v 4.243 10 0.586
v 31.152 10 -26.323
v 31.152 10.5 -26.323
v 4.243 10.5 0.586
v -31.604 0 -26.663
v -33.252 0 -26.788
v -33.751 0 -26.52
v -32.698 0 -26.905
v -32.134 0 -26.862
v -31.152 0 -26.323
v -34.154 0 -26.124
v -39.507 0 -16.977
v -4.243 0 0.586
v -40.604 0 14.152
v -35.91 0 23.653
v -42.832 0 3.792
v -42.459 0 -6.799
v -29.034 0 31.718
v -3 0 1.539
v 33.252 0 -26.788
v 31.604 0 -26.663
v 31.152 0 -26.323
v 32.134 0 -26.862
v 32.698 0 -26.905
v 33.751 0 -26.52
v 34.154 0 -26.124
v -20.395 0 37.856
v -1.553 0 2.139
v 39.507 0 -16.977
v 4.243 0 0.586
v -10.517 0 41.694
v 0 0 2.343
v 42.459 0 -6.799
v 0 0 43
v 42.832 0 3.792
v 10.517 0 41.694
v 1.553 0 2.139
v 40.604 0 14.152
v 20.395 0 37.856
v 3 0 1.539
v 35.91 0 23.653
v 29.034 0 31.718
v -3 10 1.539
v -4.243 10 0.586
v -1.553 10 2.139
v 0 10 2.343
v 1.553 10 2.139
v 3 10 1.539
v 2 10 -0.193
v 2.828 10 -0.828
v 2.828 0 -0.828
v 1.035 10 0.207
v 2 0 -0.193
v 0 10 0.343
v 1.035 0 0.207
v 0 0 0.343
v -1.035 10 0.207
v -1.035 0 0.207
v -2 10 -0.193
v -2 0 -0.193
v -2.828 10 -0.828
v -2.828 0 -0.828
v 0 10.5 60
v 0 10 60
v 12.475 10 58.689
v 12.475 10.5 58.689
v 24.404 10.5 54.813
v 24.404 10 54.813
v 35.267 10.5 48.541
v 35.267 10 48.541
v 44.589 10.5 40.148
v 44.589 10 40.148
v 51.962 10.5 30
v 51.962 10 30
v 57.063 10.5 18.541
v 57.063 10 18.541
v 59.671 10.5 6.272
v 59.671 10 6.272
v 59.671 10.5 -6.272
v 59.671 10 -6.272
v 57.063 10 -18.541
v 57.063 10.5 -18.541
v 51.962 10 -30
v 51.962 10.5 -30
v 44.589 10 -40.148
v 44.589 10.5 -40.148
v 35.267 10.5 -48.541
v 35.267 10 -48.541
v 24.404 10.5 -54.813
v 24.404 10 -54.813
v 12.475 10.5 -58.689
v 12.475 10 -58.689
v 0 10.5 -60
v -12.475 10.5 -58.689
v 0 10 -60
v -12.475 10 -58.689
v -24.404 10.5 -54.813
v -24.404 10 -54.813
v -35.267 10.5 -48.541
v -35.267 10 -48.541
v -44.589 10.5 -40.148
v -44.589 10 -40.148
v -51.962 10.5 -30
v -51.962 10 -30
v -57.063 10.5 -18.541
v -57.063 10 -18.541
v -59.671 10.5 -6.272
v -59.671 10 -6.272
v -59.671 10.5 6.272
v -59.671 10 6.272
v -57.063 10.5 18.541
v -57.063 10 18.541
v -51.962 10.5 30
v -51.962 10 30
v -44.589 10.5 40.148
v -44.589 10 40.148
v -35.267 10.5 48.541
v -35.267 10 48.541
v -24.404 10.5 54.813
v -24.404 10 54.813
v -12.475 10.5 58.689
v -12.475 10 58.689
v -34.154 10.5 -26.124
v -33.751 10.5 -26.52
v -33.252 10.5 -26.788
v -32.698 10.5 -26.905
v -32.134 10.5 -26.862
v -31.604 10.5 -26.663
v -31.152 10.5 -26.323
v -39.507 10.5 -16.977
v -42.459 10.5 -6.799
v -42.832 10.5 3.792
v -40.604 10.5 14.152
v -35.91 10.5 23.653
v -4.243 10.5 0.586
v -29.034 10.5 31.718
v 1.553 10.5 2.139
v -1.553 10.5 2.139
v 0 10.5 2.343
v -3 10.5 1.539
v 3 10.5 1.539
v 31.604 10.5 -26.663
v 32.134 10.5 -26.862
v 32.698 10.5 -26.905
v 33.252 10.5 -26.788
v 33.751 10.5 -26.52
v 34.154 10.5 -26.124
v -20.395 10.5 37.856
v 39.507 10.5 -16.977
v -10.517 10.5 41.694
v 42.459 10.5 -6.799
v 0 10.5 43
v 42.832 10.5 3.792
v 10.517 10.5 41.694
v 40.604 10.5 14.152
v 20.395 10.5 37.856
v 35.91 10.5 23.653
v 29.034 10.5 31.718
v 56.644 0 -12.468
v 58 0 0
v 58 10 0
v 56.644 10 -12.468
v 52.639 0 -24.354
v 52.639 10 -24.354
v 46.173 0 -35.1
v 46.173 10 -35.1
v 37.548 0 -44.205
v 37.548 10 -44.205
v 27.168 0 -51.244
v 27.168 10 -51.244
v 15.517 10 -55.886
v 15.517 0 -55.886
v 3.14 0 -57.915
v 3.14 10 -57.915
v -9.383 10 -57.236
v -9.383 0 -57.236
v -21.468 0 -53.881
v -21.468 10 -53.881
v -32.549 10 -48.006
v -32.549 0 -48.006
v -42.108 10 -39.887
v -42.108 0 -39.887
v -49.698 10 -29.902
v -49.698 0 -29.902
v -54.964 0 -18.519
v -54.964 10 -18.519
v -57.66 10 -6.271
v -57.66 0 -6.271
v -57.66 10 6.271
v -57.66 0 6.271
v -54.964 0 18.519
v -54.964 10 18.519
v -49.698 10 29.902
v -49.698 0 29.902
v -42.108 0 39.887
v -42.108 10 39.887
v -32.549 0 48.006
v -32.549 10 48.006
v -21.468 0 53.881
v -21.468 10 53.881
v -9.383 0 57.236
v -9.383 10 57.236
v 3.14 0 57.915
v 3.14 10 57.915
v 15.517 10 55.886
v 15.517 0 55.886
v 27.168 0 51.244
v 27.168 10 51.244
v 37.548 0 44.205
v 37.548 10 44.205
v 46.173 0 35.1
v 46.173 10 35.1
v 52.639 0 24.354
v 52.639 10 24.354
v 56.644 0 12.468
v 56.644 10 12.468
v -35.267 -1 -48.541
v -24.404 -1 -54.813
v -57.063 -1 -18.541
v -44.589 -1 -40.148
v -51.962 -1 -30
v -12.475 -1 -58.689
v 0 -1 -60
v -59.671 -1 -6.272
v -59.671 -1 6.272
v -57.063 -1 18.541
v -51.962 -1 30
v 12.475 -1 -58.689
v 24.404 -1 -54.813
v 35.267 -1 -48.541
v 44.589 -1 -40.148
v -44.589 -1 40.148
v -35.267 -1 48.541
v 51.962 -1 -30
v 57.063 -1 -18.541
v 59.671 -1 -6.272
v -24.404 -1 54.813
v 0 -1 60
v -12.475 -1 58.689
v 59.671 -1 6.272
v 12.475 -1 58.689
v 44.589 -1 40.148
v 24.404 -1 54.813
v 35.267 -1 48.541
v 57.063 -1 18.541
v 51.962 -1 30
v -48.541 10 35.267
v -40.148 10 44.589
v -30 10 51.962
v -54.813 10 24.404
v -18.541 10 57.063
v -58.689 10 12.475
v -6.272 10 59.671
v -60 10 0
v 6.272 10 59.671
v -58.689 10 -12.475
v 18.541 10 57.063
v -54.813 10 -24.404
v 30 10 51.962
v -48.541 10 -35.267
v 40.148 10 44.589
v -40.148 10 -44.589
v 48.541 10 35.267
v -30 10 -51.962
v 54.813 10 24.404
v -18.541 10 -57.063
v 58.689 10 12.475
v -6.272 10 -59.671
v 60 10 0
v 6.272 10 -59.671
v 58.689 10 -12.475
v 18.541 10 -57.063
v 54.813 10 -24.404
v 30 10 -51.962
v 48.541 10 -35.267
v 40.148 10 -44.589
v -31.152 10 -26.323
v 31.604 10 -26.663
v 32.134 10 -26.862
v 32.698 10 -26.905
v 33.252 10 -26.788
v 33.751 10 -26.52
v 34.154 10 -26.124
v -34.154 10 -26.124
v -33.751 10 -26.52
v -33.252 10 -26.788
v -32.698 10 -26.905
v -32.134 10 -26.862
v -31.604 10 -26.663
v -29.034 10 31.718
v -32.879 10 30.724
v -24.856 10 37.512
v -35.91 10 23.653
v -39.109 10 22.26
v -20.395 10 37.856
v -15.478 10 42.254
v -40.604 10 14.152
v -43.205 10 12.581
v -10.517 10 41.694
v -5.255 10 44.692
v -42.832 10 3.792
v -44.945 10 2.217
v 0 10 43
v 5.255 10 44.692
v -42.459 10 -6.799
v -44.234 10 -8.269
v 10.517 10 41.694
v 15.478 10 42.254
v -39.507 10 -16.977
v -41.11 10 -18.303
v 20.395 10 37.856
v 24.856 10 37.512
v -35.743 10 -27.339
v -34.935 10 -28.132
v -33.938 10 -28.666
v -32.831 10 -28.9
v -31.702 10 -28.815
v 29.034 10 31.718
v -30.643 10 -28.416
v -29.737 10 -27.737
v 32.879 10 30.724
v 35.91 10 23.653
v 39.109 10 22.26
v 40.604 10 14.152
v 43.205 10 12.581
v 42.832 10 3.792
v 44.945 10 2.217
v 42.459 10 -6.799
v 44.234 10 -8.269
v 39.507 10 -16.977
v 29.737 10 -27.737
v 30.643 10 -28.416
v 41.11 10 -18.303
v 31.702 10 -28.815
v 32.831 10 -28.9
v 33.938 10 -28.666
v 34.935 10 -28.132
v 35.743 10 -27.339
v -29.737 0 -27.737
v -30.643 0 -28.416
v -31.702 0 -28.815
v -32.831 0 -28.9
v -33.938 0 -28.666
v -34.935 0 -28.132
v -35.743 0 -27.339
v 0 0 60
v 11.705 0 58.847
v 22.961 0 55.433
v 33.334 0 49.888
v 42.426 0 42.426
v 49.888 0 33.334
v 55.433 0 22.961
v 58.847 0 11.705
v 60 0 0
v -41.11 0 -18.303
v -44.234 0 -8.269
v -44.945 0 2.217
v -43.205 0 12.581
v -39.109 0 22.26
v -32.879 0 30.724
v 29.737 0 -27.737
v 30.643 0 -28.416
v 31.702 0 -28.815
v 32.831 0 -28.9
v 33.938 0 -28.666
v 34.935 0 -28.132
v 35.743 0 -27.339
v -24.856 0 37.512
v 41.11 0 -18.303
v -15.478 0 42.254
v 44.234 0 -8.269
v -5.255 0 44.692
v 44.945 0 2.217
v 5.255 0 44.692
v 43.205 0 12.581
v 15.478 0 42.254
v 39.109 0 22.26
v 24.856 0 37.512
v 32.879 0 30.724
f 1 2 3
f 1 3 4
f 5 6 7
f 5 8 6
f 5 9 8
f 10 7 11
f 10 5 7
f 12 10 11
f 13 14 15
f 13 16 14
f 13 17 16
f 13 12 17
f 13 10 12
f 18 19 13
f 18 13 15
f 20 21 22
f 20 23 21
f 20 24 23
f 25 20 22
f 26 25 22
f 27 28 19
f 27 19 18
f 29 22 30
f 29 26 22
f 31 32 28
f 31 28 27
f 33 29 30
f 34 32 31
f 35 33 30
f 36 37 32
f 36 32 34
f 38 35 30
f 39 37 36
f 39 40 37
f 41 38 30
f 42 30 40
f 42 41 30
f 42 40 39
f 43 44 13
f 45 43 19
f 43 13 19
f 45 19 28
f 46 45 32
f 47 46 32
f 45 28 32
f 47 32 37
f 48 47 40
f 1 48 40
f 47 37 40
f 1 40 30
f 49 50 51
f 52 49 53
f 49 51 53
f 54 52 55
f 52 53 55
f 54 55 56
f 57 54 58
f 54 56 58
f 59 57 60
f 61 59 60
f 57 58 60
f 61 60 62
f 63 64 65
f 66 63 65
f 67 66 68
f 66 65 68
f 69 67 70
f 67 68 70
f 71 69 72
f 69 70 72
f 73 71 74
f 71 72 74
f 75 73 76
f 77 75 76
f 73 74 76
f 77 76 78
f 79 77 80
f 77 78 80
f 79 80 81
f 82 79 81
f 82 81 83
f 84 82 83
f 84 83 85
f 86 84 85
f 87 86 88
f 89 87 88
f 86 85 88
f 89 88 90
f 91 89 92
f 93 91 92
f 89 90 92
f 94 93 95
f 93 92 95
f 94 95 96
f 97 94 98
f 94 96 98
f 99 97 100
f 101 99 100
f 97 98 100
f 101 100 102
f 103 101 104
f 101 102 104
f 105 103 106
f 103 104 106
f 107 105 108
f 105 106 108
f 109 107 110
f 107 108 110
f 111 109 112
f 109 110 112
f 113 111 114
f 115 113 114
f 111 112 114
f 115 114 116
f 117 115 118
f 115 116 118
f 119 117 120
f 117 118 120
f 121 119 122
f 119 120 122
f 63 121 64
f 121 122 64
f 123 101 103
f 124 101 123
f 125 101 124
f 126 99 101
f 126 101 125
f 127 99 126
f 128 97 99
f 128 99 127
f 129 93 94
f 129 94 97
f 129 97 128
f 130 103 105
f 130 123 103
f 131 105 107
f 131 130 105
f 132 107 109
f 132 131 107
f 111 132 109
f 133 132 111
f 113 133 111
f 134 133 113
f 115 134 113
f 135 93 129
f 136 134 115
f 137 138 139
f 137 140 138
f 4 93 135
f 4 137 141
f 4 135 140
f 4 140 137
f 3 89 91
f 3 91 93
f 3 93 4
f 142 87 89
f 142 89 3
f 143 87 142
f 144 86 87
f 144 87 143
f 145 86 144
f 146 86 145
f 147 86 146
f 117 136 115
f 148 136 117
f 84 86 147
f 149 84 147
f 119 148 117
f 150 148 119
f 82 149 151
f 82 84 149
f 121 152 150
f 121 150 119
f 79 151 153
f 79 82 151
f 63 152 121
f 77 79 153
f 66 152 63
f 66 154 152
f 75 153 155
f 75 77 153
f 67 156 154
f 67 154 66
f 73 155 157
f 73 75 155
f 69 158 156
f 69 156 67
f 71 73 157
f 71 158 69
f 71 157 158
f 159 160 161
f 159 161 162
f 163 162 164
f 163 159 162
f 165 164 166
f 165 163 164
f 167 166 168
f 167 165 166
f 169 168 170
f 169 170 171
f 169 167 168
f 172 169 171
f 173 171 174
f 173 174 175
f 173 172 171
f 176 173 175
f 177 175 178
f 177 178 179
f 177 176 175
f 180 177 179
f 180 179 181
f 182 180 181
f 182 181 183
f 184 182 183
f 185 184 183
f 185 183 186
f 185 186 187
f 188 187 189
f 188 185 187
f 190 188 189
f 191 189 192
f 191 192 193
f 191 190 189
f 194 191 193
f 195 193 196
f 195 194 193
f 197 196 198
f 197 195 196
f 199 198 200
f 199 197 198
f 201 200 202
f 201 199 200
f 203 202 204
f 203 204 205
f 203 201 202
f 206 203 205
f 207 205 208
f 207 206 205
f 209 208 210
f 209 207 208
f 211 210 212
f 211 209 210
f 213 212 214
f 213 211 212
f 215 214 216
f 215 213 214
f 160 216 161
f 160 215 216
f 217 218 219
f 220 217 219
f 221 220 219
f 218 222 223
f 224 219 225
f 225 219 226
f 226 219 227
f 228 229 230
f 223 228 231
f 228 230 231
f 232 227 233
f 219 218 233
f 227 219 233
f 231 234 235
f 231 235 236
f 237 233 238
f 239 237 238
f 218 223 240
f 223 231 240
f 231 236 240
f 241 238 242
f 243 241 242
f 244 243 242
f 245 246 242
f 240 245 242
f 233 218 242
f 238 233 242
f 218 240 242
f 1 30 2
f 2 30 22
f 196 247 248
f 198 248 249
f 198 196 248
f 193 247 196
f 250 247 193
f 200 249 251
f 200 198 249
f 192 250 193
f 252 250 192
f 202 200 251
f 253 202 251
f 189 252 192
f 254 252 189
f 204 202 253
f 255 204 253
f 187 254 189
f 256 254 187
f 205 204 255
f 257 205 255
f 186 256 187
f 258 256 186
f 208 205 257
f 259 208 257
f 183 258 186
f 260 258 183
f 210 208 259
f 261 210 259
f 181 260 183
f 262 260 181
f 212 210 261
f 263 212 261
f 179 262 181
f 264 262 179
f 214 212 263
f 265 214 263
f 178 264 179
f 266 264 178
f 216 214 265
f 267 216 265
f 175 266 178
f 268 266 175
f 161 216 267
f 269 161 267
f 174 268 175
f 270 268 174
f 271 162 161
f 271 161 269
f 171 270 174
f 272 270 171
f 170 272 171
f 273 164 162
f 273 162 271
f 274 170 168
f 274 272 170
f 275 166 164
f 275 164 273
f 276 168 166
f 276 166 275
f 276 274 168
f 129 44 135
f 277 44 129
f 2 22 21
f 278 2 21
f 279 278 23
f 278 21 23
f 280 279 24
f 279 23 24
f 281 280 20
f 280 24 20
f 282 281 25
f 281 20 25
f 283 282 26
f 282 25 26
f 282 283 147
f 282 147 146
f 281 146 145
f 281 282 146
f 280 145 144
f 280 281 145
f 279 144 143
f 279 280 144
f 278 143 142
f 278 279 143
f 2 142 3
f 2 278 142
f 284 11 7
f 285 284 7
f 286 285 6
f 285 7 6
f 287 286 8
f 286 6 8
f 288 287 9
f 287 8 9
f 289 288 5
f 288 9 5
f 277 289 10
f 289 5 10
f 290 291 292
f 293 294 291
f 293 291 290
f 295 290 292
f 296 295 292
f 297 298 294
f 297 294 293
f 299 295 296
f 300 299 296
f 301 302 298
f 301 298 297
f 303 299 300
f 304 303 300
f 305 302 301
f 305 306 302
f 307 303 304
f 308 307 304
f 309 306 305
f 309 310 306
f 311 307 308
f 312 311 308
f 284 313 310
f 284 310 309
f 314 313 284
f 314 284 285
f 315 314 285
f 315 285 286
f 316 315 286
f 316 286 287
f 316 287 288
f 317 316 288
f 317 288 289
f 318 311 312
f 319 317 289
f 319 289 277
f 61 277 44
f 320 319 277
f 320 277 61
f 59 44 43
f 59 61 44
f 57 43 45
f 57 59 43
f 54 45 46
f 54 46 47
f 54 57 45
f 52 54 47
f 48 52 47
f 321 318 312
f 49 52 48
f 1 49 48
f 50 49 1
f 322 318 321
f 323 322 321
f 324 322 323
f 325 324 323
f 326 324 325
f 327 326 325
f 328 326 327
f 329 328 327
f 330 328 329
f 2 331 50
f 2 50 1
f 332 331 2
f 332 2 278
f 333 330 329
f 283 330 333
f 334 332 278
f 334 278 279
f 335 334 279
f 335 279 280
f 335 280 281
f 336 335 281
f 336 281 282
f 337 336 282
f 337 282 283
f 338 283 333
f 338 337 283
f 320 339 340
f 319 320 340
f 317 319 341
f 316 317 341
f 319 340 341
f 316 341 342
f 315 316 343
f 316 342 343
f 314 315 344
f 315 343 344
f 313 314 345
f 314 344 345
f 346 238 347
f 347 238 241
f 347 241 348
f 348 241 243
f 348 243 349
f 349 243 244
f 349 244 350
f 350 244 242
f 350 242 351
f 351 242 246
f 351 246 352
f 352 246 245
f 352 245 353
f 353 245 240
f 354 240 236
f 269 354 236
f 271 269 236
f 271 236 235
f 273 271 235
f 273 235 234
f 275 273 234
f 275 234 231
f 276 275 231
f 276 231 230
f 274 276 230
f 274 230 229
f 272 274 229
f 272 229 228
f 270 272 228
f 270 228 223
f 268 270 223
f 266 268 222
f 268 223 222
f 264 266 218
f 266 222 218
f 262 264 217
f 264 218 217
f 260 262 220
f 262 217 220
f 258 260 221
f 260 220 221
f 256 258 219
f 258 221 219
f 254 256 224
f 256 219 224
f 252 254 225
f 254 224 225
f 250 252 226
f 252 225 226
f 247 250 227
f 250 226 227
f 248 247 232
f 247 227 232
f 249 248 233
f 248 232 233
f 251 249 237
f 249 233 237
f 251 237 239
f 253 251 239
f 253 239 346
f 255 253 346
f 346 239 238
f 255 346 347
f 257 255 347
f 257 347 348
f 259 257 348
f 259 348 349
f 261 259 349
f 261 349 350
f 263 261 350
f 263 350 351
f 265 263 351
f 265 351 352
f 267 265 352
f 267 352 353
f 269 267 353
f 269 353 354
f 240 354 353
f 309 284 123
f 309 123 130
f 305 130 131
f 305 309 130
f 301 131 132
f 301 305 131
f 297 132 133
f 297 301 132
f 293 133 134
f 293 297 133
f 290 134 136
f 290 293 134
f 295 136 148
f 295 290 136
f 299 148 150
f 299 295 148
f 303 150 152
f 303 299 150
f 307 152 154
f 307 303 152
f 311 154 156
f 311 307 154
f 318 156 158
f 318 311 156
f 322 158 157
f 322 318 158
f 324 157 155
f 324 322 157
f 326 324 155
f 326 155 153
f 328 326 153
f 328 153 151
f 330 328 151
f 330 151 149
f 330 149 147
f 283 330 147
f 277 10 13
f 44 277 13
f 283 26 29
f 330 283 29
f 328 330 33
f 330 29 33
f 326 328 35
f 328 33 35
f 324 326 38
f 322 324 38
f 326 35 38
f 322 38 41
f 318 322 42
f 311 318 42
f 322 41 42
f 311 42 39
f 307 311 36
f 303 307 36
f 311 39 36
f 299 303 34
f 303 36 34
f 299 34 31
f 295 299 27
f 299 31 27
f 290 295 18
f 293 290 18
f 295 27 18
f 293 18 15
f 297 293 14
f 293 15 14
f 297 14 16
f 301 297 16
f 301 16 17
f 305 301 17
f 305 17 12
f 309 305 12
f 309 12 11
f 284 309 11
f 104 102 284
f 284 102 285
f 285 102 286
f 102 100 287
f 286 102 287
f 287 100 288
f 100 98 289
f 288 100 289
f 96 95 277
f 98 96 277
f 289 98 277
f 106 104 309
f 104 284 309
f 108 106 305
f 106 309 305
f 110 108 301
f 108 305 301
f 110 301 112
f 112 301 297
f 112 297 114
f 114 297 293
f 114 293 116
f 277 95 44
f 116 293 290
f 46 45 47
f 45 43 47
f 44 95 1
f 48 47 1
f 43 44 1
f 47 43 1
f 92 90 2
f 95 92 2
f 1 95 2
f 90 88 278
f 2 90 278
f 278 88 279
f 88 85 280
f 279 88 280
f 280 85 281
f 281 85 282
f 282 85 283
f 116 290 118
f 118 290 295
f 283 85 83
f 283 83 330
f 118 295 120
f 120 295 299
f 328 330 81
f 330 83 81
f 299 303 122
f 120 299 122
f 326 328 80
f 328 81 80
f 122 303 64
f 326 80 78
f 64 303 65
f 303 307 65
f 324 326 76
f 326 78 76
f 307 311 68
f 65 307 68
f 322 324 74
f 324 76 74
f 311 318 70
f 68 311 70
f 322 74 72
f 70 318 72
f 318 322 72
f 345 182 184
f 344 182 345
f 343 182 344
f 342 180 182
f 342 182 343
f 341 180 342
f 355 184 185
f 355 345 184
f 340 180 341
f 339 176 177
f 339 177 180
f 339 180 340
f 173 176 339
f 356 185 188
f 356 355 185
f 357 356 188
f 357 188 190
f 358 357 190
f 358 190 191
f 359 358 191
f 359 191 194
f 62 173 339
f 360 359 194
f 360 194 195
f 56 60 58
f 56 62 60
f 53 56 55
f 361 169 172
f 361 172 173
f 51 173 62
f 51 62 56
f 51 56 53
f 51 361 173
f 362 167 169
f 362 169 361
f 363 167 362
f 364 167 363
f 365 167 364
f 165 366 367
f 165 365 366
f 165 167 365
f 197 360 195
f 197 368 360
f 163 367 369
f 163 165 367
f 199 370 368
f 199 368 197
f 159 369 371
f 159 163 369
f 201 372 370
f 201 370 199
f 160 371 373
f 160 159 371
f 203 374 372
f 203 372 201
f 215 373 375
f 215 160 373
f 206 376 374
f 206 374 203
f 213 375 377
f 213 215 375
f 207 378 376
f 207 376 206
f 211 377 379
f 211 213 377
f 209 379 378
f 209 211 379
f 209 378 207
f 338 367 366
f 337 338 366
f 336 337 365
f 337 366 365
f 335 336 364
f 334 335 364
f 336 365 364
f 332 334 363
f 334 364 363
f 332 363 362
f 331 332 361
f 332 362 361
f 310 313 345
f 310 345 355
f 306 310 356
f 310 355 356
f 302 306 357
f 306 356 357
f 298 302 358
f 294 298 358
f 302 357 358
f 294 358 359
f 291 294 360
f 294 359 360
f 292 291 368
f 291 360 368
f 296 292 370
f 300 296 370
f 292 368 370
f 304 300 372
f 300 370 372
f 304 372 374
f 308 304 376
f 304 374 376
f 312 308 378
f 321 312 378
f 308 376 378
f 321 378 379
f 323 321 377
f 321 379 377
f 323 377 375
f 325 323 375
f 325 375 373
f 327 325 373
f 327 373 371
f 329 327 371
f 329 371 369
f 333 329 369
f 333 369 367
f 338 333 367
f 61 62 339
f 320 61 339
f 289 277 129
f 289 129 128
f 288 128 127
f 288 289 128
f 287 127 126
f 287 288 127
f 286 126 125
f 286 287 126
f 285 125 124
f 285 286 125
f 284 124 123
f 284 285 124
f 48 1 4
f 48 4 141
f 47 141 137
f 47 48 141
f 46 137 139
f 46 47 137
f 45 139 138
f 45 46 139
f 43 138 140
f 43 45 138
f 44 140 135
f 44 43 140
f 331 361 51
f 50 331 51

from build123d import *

# Parameters (mm, degrees)
SKETCH1_R             = 60
SKETCH1_R_2           = 58
EXTRUDE_THIN1_DEPTH   = 10
EXTRUDE_THIN1_2_DEPTH = 10
BOSS_EXTRUDE1_START   = -1
SKETCH2_R             = 60
BOSS_EXTRUDE1_DEPTH   = 1
SKETCH4_R             = 60
BOSS_EXTRUDE3_DEPTH   = 0.5


with BuildPart() as part:
    # Sketch1 → Extrude-Thin1 (new body)
    with BuildSketch(Plane(origin=(0, 0, 0), x_dir=(1, 0, 0), z_dir=(0, 1, 0))):
        Circle(SKETCH1_R)
        Circle(SKETCH1_R_2, mode=Mode.SUBTRACT)
    extrude(amount=EXTRUDE_THIN1_DEPTH)



with BuildPart() as body_2:
    # Sketch1 → Extrude-Thin1 2 (new body)
    with BuildSketch(Plane(origin=(0, 0, 0), x_dir=(1, 0, 0), z_dir=(0, 1, 0))):
        with BuildLine():
            Line((-29.737486768, 27.737486768), (-2.828427125, 0.828427125))
            ThreePointArc((-2.828427125, 0.828427125), (0, -0.343145751), (2.828427125, 0.828427125))
            Line((2.828427125, 0.828427125), (29.737486768, 27.737486768))
            ThreePointArc((29.737486768, 27.737486768), (32.830602007, 28.900292561), (35.743076224, 27.339211804))
            ThreePointArc((35.743076224, 27.339211804), (0, -45), (-35.743076224, 27.339211804))
            ThreePointArc((-35.743076224, 27.339211804), (-32.830602007, 28.900292561), (-29.737486768, 27.737486768))
        make_face()
        with BuildLine():
            Line((-31.151700331, 26.323273206), (-4.242640687, -0.585786438))
            ThreePointArc((-4.242640687, -0.585786438), (0, -2.343145751), (4.242640687, -0.585786438))
            Line((4.242640687, -0.585786438), (31.151700331, 26.323273206))
            ThreePointArc((31.151700331, 26.323273206), (32.69825795, 26.904676102), (34.154495058, 26.124135724))
            ThreePointArc((34.154495058, 26.124135724), (0, -43), (-34.154495058, 26.124135724))
            ThreePointArc((-34.154495058, 26.124135724), (-32.69825795, 26.904676102), (-31.151700331, 26.323273206))
        make_face(mode=Mode.SUBTRACT)
    extrude(amount=EXTRUDE_THIN1_2_DEPTH)


with BuildPart() as part_1:
    add(part.part)

    add(body_2.part)  # Boss-Extrude1 merges body 2
    # Sketch2 → Boss-Extrude1 (add)
    with BuildSketch(Plane(origin=(0, 0, 0), x_dir=(1, 0, 0), z_dir=(0, 1, 0)).offset(BOSS_EXTRUDE1_START)):
        Circle(SKETCH2_R)
    extrude(amount=BOSS_EXTRUDE1_DEPTH)


with BuildPart() as body_2_2:
    # Sketch4 → Boss-Extrude3 (new body)
    with BuildSketch(Plane(origin=(0, 10, 0), x_dir=(1, 0, 0), z_dir=(0, 1, 0))):
        Circle(SKETCH4_R)
        with BuildLine():
            Line((-4.242640687, -0.585786438), (-31.151700331, 26.323273206))
            ThreePointArc((-31.151700331, 26.323273206), (-32.69825795, 26.904676102), (-34.154495058, 26.124135724))
            ThreePointArc((-34.154495058, 26.124135724), (0, -43), (34.154495058, 26.124135724))
            ThreePointArc((34.154495058, 26.124135724), (32.69825795, 26.904676102), (31.151700331, 26.323273206))
            Line((31.151700331, 26.323273206), (4.242640687, -0.585786438))
            ThreePointArc((4.242640687, -0.585786438), (0, -2.343145751), (-4.242640687, -0.585786438))
        make_face(mode=Mode.SUBTRACT)
    extrude(amount=BOSS_EXTRUDE3_DEPTH)


solid = Compound([part_1.part, body_2_2.part])
